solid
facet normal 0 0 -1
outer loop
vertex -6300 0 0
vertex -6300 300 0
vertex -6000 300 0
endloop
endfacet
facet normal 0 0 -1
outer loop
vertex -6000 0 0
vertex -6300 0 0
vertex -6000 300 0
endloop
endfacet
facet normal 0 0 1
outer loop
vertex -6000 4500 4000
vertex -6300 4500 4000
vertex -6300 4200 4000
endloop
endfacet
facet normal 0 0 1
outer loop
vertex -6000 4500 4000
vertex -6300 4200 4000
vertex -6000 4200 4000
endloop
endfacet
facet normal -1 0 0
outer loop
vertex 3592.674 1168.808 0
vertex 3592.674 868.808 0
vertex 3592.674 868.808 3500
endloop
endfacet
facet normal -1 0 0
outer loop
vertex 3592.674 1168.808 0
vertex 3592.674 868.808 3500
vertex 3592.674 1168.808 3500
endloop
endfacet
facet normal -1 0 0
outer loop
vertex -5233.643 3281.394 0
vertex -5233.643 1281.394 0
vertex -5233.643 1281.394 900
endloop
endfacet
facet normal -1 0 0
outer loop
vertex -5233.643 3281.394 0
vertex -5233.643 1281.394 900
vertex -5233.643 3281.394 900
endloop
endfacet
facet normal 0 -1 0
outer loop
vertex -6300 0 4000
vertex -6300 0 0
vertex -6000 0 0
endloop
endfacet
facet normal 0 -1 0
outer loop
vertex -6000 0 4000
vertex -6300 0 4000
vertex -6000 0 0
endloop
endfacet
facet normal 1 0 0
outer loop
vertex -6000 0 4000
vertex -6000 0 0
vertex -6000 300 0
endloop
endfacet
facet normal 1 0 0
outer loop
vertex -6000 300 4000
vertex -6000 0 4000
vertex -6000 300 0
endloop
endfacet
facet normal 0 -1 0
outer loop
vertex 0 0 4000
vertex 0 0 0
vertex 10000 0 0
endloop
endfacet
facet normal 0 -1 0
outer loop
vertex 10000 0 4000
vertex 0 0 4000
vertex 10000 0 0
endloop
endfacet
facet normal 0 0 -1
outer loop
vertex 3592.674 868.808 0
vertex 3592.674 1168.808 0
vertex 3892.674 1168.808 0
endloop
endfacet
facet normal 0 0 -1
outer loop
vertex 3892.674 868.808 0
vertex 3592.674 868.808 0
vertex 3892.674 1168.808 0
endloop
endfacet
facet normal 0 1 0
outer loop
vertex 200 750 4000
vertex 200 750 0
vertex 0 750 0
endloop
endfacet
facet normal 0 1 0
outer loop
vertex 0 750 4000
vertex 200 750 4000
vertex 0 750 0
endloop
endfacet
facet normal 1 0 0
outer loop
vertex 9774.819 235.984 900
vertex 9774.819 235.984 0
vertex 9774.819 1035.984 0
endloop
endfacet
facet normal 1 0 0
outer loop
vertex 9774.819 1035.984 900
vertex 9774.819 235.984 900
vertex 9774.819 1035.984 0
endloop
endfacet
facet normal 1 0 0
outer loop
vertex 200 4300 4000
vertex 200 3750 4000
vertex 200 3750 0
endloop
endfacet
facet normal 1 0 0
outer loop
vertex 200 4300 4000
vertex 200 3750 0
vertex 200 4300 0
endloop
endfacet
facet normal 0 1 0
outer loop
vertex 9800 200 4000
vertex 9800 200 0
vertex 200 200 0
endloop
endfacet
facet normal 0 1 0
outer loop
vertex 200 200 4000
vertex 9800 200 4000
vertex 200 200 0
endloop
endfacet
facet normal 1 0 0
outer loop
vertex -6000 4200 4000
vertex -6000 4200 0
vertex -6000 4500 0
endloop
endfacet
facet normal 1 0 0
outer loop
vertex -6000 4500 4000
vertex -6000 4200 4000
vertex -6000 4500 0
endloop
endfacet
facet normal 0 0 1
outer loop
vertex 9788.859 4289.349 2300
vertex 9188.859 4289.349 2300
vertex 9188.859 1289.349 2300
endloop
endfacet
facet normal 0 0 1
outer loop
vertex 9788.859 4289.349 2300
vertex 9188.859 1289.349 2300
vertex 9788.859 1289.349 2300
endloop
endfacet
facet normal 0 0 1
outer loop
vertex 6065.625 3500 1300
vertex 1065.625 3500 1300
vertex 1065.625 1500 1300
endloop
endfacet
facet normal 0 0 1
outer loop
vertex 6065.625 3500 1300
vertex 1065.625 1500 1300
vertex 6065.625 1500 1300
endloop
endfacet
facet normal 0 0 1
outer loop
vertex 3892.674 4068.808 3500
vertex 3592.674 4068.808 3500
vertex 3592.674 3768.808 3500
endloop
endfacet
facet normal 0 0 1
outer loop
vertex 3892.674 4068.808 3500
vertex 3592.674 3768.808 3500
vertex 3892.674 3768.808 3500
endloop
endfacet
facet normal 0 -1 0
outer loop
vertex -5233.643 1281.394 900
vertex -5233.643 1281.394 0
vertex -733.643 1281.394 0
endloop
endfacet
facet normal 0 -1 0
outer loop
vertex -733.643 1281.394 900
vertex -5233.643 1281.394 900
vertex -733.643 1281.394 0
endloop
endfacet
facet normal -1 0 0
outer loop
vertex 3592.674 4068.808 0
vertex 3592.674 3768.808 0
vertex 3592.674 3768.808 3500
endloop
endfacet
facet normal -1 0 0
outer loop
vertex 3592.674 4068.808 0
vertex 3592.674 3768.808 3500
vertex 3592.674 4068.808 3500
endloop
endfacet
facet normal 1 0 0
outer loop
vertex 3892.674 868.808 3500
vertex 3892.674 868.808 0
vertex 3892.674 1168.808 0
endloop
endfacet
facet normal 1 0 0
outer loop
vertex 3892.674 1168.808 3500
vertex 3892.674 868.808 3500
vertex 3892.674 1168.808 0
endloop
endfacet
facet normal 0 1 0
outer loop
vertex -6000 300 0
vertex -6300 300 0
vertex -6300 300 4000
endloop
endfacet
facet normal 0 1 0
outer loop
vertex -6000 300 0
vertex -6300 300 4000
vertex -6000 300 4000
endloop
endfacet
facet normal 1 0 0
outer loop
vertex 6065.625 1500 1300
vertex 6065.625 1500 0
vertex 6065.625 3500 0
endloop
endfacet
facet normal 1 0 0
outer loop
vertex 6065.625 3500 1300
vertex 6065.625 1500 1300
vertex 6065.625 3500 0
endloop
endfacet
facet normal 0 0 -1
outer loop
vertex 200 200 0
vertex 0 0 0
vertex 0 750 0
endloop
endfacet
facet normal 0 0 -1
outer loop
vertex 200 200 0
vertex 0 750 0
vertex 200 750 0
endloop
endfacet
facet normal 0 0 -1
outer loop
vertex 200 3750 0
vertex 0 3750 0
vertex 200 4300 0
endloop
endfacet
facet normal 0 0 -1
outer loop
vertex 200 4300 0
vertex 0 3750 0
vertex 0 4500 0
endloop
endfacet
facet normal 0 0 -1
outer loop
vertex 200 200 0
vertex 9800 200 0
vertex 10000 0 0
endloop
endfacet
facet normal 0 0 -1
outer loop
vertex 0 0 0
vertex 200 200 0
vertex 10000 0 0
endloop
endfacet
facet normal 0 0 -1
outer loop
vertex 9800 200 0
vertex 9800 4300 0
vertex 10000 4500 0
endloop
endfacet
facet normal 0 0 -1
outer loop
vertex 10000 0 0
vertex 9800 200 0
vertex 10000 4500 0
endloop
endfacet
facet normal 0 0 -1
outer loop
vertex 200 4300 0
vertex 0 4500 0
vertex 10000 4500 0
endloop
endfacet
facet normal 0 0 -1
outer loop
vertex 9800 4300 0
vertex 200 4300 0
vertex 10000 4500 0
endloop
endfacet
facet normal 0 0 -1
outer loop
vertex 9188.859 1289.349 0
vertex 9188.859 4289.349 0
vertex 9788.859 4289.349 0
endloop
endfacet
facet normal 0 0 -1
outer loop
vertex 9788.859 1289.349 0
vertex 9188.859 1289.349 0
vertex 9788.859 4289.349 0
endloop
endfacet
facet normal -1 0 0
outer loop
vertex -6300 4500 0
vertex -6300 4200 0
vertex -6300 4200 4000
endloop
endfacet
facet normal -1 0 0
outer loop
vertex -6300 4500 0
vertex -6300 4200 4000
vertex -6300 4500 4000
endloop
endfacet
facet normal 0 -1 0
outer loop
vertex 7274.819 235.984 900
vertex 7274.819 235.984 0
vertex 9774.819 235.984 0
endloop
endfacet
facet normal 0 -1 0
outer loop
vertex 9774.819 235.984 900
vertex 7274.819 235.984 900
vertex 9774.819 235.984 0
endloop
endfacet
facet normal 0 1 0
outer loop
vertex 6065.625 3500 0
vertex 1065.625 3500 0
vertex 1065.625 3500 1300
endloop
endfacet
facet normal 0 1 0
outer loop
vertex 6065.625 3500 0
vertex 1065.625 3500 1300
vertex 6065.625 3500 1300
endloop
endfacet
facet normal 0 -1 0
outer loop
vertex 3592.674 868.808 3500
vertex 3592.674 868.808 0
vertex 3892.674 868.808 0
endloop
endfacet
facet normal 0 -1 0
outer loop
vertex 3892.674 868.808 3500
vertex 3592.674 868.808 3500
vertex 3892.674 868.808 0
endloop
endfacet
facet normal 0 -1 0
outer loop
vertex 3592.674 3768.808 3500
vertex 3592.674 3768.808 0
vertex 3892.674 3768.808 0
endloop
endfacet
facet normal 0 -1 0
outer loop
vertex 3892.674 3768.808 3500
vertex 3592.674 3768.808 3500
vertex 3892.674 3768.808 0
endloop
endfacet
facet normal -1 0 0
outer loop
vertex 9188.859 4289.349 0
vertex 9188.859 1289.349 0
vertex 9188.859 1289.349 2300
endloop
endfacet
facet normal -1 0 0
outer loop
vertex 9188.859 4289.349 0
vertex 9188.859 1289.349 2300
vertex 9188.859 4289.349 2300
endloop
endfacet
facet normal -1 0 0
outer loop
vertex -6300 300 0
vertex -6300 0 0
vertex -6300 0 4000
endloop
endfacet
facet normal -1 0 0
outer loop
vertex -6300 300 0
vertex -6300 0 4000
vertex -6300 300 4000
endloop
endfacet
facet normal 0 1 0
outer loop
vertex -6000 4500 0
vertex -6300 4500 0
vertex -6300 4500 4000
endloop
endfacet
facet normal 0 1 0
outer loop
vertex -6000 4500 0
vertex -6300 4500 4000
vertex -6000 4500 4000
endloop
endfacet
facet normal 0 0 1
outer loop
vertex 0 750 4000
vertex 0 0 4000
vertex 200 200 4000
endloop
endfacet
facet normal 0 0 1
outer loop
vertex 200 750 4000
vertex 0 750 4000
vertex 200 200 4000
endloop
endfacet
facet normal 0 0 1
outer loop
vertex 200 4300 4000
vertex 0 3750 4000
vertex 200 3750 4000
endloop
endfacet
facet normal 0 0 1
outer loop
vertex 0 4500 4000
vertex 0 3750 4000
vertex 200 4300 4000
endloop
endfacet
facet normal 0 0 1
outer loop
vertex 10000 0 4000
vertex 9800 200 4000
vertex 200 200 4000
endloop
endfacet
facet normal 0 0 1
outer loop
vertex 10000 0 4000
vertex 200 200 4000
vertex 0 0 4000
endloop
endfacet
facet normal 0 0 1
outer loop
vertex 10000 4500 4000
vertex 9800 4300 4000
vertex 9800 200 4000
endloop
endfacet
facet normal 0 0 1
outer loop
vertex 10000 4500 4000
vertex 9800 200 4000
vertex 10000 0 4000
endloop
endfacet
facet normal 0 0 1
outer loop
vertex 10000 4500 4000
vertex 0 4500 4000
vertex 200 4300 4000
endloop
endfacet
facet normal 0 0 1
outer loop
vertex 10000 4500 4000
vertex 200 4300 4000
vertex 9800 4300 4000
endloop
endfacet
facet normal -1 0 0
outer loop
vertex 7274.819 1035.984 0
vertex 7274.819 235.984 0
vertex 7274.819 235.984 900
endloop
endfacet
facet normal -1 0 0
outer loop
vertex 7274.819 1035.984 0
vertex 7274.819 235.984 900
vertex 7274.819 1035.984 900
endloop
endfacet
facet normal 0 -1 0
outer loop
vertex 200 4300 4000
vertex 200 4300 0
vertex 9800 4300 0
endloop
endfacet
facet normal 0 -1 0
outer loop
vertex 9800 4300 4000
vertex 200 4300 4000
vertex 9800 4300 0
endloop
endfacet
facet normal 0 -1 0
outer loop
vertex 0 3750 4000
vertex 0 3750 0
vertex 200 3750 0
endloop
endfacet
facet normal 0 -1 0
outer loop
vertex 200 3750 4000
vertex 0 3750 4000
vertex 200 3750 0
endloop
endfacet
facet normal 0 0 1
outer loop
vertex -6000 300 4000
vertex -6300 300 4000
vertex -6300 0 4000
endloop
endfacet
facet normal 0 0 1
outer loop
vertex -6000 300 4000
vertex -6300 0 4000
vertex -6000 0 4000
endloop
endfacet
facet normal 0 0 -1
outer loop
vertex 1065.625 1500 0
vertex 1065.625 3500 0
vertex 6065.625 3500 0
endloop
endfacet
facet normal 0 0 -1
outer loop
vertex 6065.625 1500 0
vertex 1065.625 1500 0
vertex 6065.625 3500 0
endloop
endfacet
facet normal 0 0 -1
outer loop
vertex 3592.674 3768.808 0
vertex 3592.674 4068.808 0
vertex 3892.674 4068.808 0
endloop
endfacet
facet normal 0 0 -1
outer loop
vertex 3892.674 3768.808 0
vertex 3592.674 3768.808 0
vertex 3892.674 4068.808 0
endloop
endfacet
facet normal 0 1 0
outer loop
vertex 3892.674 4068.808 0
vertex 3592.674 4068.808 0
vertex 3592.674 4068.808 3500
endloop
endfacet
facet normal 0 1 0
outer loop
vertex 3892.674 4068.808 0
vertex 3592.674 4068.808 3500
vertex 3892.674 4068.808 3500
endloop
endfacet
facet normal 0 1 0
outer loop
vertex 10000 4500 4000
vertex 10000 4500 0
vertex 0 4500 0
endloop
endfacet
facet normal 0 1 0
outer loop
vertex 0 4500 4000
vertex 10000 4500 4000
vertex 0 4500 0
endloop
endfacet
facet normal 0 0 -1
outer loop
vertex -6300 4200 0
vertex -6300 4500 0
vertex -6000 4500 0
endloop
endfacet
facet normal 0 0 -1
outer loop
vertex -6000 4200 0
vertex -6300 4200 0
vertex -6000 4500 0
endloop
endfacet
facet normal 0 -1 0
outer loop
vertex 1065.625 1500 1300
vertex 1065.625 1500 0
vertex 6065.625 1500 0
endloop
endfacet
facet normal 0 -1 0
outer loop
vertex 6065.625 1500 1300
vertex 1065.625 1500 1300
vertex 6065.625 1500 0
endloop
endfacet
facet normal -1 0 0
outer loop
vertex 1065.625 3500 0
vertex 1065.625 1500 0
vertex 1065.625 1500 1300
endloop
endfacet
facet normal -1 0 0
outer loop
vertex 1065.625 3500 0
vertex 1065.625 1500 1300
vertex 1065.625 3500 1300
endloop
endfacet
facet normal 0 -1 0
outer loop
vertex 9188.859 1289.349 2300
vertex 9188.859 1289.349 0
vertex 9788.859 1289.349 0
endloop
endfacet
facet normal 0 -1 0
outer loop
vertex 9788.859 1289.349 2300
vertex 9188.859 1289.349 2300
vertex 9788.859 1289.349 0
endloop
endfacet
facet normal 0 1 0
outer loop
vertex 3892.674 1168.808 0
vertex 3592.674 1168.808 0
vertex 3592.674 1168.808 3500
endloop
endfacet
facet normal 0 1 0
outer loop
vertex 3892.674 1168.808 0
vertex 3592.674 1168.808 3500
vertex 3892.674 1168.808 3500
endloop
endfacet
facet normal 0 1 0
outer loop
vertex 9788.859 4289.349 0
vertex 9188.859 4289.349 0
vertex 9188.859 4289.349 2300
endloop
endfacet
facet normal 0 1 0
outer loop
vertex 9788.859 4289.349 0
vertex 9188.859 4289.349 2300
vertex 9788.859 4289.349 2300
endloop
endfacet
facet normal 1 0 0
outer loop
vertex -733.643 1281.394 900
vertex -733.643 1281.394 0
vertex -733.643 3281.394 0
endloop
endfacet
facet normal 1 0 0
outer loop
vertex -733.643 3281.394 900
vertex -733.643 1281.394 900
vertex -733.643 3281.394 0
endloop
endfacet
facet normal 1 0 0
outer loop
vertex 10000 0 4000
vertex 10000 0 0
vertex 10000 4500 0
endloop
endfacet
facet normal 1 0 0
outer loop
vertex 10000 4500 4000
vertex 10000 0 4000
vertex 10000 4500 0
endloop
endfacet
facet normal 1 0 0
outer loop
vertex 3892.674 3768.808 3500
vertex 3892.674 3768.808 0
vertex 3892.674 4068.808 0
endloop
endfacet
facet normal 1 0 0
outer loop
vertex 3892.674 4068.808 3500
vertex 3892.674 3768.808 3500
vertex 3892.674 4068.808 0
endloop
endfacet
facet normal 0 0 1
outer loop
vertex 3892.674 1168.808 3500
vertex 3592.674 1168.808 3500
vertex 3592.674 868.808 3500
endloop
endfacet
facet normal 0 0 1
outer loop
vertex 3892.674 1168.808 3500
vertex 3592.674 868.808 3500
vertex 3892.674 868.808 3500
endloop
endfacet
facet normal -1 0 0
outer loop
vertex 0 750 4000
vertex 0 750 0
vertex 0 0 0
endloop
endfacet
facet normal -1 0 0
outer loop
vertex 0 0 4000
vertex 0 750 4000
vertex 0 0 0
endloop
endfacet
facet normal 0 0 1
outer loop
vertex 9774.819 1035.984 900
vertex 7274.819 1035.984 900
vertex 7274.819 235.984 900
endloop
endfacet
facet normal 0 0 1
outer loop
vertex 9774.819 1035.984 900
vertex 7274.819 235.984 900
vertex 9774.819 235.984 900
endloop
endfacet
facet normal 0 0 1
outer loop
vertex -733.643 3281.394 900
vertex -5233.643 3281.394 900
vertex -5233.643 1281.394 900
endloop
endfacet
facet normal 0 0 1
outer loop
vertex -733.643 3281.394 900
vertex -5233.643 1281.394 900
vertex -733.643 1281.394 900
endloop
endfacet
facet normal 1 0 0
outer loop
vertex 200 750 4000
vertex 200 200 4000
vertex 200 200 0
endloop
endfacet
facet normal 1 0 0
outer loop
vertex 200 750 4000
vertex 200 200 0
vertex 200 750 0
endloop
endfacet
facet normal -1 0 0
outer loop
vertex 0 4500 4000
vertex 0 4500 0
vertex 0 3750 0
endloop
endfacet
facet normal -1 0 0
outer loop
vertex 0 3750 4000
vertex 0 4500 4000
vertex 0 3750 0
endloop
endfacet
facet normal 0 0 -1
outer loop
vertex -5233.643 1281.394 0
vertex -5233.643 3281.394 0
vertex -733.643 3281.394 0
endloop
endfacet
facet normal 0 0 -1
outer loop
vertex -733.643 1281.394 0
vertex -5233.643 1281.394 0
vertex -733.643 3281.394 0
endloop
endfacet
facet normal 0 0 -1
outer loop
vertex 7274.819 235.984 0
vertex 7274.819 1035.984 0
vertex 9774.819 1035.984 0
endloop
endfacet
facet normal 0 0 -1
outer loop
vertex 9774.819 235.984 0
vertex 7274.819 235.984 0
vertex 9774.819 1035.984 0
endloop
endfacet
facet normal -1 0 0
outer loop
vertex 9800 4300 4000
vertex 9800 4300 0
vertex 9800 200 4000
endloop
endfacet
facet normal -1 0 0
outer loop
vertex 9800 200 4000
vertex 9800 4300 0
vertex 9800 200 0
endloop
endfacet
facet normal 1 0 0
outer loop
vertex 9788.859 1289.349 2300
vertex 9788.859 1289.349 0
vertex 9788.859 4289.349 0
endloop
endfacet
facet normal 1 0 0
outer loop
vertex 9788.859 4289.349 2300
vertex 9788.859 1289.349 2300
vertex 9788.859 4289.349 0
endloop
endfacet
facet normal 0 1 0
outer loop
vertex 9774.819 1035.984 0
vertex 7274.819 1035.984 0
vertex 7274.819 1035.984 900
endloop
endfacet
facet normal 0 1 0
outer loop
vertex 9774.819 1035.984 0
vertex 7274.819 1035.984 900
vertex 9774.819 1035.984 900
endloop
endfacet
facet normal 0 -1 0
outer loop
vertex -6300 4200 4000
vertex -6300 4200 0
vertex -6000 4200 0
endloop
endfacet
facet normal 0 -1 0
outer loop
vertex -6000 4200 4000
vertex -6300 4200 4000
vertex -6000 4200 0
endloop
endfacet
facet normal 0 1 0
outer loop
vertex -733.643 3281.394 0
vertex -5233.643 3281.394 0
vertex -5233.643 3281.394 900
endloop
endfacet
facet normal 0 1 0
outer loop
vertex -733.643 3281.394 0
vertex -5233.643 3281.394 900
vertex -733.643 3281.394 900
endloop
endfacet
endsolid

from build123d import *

# Parameters (mm, degrees)
F0_W     = 300
F0_H     = 300
F1_DEPTH = 4000
F2_W     = 5000
F2_H     = 2000
F3_DEPTH = 1300
F4_W     = 600
F4_H     = 3000
F5_DEPTH = 2300
F2_W_2   = 4500
F6_DEPTH = 900
F7_W     = 300
F7_H     = 300
F8_DEPTH = 3500
F4_W_2   = 2500
F4_H_2   = 800
F9_DEPTH = 900


with BuildPart() as f1:
    # F0 (on Top) → F1 (new body)
    with BuildSketch(Plane.XY):
        Polygon((0, 750), (0, 0), (10000, 0), (10000, 4500), (0, 4500), (0, 3750), (200, 3750), (200, 4300), (9800, 4300), (9800, 200), (200, 200), (200, 750), align=None)
        with Locations((-6150, 4350)):
            Rectangle(F0_W, F0_H)
        with Locations((-6150, 150)):
            Rectangle(F0_W, F0_H)
    extrude(amount=F1_DEPTH)


with BuildPart() as f3:
    # F2 (on Top) → F3 (new body)
    with BuildSketch(Plane.XY):
        with Locations((3565.624595, 2500)):
            Rectangle(F2_W, F2_H)
    extrude(amount=F3_DEPTH)


with BuildPart() as f5:
    # F4 (on Top) → F5 (new body)
    with BuildSketch(Plane.XY):
        with Locations((9488.859367, 2789.348945)):
            Rectangle(F4_W, F4_H)
    extrude(amount=F5_DEPTH)


with BuildPart() as f6:
    # F2 (on Top) → F6 (new body)
    with BuildSketch(Plane.XY):
        with Locations((-2983.642519, 2281.394482)):
            Rectangle(F2_W_2, F2_H)
    extrude(amount=F6_DEPTH)


with BuildPart() as f8:
    # F7 (on Top) → F8 (new body)
    with BuildSketch(Plane.XY):
        with Locations((3742.674494, 3918.808126)):
            Rectangle(F7_W, F7_H)
        with Locations((3742.674494, 1018.808126)):
            Rectangle(F7_W, F7_H)
    extrude(amount=F8_DEPTH)


with BuildPart() as f9:
    # F4 (on Top) → F9 (new body)
    with BuildSketch(Plane.XY):
        with Locations((8524.819374, 635.98434)):
            Rectangle(F4_W_2, F4_H_2)
    extrude(amount=F9_DEPTH)


solid = Compound([f1.part, f3.part, f5.part, f6.part, f8.part, f9.part])
